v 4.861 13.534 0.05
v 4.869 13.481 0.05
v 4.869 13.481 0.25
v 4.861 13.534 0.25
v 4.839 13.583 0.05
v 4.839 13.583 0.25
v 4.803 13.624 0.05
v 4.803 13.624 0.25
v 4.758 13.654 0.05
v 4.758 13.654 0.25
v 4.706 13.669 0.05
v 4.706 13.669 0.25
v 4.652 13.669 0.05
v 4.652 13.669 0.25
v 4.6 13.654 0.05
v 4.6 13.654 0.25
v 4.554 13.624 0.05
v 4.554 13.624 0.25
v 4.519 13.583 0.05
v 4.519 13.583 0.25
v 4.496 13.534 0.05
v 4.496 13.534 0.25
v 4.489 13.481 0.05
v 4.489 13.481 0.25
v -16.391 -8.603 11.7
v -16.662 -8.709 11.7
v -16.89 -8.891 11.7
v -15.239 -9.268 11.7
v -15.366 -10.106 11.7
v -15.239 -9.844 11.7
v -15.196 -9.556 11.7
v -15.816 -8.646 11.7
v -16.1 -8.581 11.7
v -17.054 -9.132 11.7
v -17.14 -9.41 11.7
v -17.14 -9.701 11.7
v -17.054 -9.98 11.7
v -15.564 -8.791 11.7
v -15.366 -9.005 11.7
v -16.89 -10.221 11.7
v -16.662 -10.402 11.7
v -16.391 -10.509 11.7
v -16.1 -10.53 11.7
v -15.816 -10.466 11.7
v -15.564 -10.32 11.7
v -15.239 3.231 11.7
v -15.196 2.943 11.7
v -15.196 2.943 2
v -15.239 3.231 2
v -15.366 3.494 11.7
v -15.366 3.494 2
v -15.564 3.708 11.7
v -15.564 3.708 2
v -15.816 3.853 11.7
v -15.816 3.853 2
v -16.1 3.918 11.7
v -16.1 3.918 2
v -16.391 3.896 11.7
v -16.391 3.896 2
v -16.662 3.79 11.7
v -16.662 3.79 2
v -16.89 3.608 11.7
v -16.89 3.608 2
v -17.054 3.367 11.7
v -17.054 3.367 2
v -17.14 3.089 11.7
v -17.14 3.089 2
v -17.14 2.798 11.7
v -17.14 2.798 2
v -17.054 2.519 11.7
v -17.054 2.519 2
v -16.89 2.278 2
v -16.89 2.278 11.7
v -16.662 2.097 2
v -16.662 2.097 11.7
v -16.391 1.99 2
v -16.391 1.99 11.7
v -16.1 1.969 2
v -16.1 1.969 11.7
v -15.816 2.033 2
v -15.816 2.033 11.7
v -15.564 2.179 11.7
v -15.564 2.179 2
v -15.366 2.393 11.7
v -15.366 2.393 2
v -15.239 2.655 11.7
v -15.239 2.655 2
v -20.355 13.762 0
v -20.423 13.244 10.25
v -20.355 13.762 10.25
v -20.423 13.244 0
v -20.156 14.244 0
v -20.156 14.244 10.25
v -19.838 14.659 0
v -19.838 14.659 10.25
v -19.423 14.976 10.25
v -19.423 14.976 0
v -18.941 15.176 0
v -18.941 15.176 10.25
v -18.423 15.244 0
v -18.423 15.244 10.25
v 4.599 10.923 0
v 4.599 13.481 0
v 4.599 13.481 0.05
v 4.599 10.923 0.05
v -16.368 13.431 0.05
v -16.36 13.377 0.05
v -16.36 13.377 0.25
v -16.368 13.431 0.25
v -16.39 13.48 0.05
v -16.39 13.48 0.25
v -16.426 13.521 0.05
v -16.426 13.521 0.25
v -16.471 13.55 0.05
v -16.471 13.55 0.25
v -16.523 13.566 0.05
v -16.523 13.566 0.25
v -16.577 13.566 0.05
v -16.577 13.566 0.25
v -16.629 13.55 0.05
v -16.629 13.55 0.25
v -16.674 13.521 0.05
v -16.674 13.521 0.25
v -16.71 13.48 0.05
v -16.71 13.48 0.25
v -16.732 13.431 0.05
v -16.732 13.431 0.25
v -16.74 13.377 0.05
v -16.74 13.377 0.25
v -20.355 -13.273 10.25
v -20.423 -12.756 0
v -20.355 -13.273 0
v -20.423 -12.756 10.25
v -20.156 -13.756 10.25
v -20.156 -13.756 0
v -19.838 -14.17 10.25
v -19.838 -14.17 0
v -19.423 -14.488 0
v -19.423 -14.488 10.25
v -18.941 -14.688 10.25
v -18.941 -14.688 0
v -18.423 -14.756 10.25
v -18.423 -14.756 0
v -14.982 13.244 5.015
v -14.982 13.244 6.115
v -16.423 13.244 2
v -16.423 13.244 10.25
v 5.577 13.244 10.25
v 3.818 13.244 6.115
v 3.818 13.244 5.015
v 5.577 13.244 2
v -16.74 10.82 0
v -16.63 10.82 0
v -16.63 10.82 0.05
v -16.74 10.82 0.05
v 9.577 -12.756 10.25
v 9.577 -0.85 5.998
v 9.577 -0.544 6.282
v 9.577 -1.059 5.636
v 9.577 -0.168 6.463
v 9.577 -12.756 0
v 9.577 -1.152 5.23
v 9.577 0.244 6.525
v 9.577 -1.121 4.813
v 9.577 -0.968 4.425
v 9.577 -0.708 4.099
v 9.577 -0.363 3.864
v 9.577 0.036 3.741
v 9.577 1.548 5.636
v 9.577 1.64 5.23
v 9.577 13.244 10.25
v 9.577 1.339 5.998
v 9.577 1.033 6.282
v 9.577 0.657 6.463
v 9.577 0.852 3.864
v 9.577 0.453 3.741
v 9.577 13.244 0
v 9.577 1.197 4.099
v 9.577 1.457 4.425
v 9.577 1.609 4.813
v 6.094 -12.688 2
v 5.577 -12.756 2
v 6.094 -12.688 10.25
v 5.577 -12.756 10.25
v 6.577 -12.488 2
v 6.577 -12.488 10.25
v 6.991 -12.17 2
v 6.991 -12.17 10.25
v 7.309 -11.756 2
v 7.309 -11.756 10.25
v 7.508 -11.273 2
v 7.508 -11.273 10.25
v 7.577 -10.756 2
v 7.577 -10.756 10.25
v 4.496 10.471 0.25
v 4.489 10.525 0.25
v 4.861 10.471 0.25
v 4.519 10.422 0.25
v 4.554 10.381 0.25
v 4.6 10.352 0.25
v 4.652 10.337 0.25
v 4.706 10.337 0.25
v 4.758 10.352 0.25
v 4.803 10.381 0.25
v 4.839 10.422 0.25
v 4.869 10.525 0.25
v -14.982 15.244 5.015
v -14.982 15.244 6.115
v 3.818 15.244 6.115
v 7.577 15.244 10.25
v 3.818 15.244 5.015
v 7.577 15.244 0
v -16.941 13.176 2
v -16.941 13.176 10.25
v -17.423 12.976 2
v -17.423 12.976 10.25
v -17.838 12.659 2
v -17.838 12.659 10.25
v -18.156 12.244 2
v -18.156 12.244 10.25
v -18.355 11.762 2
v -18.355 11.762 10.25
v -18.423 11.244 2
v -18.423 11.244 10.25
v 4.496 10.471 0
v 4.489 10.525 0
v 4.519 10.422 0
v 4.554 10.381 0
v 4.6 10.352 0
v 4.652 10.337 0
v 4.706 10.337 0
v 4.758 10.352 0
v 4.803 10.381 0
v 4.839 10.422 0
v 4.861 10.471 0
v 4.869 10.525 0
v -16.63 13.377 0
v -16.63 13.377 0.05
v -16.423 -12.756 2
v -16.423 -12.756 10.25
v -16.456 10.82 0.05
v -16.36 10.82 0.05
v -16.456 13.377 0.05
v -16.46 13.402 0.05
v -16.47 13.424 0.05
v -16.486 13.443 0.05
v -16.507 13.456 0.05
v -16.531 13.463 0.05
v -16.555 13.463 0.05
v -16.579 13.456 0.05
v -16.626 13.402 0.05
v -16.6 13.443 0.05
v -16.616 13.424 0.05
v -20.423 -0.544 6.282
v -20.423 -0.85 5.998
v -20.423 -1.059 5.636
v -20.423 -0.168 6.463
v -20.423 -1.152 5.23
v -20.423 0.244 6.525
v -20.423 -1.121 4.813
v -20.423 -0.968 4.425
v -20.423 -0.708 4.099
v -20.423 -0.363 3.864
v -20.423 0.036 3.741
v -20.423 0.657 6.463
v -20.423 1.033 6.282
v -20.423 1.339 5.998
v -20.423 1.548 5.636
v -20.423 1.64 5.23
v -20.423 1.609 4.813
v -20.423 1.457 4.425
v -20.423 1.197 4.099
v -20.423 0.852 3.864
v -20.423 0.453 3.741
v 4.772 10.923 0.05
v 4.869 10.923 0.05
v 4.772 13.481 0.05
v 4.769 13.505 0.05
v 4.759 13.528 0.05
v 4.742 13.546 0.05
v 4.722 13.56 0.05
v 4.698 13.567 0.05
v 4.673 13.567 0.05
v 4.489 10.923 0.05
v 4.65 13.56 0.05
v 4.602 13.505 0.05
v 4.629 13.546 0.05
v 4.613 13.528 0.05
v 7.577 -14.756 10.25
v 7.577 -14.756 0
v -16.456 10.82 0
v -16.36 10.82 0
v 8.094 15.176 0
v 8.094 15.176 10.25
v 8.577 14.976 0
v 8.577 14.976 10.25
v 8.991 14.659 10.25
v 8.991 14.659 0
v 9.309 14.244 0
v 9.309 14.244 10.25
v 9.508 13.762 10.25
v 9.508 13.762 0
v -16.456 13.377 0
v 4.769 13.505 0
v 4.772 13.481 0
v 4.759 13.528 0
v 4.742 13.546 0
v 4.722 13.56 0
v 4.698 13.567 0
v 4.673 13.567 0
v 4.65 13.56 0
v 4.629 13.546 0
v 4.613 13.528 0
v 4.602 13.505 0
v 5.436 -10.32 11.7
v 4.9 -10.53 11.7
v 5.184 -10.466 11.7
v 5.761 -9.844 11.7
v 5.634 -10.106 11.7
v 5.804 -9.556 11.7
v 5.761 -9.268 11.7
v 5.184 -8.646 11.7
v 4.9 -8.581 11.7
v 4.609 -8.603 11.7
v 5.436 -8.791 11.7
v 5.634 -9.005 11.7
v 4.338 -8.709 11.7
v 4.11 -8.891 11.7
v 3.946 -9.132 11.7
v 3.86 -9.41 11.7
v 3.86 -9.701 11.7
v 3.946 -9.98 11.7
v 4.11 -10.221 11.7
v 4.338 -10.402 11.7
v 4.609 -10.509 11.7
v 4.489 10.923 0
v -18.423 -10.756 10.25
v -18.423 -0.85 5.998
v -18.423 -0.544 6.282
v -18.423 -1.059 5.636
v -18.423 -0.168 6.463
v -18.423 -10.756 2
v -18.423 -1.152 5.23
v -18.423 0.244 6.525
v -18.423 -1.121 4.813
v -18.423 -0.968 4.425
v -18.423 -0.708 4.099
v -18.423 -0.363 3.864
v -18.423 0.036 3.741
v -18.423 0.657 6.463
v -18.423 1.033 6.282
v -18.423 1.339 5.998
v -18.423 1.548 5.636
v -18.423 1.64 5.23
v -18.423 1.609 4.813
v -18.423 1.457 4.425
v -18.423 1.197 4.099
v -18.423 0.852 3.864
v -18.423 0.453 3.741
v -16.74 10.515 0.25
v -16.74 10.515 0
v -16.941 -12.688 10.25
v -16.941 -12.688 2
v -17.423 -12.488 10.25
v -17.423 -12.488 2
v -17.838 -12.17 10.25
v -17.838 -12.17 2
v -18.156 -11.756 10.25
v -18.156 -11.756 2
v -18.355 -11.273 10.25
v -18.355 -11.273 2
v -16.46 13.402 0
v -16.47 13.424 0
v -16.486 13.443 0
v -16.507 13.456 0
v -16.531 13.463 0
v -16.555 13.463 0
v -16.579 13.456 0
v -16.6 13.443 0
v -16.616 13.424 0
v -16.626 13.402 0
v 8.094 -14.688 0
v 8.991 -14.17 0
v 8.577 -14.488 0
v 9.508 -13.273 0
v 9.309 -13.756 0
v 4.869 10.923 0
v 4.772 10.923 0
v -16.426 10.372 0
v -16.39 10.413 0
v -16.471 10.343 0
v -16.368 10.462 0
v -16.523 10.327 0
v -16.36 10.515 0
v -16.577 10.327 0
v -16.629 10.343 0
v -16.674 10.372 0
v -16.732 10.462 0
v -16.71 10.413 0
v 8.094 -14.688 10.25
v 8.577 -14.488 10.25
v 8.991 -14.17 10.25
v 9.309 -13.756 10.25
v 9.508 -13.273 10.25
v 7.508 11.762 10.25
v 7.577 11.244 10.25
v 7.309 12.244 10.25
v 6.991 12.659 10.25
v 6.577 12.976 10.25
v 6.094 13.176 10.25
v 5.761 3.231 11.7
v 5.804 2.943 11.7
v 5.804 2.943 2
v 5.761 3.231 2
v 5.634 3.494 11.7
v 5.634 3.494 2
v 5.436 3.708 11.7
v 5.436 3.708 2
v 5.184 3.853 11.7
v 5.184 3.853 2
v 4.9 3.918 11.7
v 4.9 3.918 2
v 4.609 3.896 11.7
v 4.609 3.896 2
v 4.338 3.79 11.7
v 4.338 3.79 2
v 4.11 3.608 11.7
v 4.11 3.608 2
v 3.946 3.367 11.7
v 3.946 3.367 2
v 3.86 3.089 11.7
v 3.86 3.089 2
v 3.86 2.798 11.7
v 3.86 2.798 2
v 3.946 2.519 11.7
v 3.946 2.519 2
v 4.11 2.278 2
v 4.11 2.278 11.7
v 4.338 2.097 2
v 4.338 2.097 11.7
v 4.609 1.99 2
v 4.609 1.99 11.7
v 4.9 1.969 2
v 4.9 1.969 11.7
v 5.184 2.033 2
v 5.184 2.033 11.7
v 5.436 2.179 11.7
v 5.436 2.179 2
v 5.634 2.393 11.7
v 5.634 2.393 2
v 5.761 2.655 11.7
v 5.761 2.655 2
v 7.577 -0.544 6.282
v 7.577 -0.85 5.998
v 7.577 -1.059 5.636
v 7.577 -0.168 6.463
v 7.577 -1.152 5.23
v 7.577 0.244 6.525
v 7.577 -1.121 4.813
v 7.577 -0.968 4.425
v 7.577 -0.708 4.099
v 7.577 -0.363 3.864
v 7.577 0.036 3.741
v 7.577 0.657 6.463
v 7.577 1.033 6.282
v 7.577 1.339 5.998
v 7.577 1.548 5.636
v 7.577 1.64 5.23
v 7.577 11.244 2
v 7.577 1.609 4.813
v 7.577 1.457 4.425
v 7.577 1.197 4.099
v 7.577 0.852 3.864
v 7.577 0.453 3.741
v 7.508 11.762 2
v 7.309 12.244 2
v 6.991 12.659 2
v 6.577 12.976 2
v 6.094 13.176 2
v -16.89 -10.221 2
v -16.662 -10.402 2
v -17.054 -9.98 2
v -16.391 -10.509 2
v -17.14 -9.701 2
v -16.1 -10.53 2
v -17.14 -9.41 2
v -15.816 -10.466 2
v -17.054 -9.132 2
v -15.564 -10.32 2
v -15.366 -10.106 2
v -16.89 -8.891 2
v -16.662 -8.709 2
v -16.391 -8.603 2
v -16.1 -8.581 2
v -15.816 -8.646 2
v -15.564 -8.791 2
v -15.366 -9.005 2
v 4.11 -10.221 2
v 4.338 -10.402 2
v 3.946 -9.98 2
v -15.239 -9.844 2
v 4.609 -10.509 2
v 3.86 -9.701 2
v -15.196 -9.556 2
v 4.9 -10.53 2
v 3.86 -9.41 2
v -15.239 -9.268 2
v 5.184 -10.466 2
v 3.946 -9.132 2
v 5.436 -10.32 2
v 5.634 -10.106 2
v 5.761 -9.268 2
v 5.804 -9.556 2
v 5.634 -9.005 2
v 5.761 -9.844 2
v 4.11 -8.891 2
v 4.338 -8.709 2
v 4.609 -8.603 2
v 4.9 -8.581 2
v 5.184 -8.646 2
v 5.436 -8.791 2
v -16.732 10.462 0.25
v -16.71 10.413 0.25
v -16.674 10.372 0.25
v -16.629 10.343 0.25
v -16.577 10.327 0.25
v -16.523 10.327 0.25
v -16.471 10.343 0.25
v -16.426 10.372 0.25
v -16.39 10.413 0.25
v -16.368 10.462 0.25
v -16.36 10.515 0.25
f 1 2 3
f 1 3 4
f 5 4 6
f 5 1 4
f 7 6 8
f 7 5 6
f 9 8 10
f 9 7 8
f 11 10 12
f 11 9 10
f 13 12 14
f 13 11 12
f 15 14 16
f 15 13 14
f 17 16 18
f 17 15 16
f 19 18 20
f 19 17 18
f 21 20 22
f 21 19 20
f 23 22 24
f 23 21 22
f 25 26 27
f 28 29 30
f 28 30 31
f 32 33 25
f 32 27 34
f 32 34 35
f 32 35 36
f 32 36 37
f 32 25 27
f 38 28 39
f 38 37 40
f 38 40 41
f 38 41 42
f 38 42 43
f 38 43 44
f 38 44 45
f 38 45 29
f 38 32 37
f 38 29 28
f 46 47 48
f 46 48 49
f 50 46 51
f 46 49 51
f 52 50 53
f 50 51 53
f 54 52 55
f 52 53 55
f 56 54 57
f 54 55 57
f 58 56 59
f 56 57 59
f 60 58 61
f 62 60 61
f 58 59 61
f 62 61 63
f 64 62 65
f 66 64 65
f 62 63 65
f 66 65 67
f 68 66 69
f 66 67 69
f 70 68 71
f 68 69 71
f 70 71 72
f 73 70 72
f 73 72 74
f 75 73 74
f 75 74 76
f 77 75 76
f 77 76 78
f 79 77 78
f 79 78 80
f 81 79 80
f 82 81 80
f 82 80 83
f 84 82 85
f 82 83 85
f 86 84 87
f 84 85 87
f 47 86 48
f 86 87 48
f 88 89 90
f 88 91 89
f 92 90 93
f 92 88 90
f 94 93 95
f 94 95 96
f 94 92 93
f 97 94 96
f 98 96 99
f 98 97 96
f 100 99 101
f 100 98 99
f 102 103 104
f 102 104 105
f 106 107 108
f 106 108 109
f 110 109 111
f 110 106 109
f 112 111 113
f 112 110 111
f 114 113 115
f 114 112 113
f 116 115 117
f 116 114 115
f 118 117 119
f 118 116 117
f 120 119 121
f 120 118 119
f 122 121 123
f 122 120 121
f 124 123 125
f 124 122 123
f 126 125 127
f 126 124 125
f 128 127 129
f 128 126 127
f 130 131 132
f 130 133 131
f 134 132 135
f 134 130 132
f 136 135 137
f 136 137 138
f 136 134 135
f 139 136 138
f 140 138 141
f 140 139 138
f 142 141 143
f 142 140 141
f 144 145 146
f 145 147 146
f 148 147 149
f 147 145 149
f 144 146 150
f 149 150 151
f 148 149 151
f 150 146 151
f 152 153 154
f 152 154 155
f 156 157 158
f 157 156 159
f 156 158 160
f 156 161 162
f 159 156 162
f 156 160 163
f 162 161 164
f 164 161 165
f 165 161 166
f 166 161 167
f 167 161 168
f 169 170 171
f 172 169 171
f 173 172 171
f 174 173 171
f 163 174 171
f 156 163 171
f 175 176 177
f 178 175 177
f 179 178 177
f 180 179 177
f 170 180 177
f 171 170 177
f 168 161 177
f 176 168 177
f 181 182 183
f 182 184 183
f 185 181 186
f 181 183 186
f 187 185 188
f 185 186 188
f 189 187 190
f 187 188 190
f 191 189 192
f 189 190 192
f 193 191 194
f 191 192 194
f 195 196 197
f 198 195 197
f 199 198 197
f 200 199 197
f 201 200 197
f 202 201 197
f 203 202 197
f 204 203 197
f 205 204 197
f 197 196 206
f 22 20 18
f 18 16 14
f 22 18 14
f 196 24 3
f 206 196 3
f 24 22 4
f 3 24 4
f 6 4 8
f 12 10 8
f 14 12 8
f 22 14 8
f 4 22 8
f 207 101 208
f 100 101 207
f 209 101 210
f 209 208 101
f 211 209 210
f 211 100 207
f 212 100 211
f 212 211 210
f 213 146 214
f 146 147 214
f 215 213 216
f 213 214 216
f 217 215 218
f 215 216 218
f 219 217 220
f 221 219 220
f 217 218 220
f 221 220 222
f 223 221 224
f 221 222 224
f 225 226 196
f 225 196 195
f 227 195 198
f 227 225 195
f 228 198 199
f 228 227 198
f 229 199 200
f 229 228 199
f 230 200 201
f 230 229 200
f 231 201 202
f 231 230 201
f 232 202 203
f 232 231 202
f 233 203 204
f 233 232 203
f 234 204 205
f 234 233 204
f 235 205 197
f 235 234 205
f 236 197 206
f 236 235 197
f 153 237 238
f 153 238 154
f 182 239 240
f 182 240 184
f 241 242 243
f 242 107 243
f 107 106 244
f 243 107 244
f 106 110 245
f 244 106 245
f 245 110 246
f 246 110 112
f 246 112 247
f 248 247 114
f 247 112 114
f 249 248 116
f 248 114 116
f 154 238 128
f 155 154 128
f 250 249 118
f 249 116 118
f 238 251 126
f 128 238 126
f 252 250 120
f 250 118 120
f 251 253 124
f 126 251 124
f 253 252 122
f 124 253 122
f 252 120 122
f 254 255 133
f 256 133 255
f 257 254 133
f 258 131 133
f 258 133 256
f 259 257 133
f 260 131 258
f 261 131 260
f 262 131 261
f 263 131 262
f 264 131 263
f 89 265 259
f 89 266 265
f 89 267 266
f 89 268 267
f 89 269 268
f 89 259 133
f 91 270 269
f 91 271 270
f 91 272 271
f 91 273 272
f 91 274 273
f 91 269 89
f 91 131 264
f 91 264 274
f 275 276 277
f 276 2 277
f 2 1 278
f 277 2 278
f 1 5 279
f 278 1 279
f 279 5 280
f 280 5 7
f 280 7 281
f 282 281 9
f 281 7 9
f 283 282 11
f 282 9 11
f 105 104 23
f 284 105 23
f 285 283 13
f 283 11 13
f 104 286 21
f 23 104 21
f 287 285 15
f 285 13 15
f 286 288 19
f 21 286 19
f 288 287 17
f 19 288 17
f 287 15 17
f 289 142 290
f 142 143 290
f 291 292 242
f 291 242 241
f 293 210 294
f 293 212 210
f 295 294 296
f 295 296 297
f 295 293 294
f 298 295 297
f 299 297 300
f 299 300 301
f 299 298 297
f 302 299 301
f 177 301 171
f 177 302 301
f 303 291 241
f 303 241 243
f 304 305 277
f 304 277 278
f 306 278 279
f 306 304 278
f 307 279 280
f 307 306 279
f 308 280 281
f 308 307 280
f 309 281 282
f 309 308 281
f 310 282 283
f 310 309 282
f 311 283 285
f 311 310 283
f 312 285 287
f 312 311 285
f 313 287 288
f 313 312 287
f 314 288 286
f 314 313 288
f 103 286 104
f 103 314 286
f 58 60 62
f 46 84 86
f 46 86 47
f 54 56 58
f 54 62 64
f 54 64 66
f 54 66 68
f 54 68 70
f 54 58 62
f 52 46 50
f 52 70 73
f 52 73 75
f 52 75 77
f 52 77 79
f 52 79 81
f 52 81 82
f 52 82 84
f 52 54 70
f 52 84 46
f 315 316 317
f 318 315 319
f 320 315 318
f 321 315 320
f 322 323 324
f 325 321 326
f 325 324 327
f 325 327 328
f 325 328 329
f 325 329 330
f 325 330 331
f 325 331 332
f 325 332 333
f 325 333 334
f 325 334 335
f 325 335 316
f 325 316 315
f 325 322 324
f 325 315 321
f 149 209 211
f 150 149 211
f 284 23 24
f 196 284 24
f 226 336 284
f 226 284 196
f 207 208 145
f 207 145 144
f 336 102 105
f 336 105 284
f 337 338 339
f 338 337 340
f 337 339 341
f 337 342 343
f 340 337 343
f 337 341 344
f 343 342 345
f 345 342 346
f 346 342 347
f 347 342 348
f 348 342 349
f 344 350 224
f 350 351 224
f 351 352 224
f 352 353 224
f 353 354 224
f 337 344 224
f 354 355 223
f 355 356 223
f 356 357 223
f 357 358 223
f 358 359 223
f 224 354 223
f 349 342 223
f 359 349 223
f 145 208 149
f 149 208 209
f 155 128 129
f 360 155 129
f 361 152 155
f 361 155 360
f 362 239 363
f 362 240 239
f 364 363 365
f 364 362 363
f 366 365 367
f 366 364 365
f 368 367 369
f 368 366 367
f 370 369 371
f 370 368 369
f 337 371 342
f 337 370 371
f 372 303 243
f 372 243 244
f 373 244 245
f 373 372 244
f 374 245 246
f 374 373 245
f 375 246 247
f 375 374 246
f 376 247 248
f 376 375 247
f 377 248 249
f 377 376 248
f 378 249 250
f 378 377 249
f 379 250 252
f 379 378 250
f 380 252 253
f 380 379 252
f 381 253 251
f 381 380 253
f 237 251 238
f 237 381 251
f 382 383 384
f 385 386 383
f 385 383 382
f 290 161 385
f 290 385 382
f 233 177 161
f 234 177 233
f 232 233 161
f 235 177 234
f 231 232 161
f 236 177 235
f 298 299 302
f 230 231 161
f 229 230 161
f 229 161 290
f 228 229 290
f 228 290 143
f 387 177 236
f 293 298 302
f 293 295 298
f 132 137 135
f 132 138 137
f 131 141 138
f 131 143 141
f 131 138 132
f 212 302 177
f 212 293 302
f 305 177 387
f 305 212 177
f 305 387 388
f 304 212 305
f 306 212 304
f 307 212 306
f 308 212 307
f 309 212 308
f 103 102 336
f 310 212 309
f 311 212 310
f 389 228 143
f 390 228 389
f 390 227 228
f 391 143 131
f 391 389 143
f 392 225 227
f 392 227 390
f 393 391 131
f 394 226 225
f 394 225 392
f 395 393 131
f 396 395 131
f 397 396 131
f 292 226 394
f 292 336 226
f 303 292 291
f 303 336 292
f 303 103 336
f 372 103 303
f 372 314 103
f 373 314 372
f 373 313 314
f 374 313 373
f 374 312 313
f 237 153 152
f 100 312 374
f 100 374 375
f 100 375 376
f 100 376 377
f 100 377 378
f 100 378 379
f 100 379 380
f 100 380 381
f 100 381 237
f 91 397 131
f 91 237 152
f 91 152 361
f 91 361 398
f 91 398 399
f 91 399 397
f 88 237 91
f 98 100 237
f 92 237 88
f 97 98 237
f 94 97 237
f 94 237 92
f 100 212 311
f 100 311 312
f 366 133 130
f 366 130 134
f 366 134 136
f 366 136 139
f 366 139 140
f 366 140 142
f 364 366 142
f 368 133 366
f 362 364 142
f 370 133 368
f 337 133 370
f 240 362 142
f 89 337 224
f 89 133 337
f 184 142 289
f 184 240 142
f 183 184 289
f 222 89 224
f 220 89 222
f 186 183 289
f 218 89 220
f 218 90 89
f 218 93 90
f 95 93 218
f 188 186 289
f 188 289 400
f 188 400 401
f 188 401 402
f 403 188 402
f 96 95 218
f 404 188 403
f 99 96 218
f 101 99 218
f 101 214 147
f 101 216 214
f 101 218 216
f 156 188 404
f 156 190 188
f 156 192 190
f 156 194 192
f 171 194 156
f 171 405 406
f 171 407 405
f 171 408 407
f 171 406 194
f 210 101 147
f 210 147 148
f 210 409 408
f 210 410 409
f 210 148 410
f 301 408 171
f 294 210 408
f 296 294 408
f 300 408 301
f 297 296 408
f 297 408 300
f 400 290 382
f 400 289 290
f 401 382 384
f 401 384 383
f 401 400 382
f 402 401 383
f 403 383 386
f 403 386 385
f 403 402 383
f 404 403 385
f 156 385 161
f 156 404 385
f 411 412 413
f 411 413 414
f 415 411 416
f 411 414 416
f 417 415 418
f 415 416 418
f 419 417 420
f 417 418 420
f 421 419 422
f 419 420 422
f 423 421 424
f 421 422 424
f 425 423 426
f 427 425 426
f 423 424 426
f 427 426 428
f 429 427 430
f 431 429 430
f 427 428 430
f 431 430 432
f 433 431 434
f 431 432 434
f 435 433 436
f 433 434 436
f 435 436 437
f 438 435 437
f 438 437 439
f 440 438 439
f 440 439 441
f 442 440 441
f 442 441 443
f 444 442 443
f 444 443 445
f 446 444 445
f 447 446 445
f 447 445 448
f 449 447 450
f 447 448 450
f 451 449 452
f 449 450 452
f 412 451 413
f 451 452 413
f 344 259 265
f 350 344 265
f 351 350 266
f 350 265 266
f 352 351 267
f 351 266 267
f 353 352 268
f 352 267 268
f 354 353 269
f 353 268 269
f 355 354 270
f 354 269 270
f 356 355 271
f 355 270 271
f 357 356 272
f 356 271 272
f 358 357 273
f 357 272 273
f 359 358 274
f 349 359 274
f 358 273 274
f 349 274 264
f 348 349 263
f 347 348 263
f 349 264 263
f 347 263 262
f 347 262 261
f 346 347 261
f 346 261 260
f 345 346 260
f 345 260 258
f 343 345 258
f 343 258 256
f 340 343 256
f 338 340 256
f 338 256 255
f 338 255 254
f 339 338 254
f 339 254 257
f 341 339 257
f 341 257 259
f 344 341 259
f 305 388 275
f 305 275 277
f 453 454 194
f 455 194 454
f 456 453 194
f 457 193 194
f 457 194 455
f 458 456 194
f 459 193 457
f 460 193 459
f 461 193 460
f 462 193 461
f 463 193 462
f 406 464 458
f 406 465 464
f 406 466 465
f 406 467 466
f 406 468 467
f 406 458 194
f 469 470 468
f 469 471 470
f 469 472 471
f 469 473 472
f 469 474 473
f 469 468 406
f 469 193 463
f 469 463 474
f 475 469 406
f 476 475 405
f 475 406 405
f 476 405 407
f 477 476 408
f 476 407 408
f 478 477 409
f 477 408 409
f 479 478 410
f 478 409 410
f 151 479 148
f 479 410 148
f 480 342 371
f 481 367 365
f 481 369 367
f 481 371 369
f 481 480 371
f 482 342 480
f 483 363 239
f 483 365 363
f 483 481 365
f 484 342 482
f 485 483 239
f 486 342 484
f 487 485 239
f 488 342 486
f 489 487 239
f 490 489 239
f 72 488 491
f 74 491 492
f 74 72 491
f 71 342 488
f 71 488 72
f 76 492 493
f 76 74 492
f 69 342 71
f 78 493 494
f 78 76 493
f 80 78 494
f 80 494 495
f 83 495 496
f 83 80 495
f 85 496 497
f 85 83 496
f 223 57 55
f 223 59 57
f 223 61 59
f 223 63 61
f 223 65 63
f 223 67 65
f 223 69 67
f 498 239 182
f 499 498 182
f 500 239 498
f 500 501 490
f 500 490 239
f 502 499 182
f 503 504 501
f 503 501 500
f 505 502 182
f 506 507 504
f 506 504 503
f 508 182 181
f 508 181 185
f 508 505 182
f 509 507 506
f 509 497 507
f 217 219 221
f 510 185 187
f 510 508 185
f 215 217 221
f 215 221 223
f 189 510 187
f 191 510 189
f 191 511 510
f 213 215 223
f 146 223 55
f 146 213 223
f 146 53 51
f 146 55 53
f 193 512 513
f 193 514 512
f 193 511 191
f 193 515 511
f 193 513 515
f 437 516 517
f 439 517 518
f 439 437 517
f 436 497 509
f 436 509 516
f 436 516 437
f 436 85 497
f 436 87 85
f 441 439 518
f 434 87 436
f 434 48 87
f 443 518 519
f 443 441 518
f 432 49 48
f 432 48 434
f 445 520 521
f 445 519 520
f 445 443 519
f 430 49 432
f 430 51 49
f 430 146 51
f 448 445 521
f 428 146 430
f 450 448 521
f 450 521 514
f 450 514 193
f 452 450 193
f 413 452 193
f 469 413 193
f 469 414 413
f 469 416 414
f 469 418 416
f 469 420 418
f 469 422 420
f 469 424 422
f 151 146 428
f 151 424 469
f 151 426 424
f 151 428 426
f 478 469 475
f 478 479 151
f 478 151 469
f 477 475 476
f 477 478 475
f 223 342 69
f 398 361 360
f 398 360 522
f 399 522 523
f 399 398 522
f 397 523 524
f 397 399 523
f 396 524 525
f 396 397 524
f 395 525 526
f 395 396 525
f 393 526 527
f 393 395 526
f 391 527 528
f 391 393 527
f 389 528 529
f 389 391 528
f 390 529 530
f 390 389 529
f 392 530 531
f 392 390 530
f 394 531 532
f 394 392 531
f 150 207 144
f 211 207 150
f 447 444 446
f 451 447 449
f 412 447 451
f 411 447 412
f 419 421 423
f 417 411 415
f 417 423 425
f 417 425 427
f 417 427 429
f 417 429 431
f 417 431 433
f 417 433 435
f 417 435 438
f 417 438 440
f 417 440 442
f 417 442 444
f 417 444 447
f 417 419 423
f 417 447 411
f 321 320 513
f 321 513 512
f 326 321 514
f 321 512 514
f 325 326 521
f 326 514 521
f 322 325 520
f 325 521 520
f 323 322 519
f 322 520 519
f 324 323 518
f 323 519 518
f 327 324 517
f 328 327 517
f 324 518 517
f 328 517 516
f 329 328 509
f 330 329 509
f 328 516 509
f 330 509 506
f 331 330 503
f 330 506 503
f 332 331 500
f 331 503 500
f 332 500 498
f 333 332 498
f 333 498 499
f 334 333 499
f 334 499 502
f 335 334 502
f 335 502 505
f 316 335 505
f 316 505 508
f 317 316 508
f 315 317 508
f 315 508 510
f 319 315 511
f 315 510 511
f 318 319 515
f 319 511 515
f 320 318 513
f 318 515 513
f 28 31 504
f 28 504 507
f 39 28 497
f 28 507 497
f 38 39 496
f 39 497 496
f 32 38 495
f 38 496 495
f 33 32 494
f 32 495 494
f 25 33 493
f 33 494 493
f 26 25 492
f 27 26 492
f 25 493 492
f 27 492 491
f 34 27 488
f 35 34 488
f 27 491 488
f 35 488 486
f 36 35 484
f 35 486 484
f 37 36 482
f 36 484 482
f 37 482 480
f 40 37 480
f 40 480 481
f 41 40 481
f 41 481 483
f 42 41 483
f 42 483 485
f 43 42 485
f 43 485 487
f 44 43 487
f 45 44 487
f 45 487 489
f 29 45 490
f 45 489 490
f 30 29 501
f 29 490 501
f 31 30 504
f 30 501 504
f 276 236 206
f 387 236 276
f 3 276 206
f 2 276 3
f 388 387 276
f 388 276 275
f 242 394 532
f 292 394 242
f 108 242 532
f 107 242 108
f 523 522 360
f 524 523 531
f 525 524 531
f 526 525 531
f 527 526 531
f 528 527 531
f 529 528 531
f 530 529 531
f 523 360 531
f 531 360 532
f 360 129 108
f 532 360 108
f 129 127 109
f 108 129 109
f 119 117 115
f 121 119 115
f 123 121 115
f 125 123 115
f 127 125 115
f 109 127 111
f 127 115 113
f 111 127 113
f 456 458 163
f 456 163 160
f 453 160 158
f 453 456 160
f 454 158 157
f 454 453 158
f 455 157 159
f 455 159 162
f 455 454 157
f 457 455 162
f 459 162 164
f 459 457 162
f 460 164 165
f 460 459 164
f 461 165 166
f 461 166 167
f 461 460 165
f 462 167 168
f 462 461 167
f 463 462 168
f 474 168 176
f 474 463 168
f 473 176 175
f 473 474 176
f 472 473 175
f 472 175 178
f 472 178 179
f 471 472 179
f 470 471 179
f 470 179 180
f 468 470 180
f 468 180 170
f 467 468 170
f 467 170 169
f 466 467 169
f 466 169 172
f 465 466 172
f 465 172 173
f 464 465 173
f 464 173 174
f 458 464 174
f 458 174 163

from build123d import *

# Parameters (mm, degrees)
SKETCH1_W           = 30
SKETCH1_H           = 30
BOSS_EXTRUDE1_DEPTH = 2
SKETCH4_R           = 0.9775
BOSS_EXTRUDE3_DEPTH = 9.7
SKETCH5_W           = 30
SKETCH5_H           = 30
SKETCH5_W_2         = 26
SKETCH5_H_2         = 26
BOSS_EXTRUDE4_DEPTH = 8.25
SKETCH6_W           = 18.8
SKETCH6_H           = 1.1
CUT_EXTRUDE1_DEPTH  = 10
FILLET1_R           = 2
CUT_EXTRUDE4_DEPTH  = 0.25
BOSS_EXTRUDE6_DEPTH = 0.05
CUT_EXTRUDE5_DEPTH  = 0.25
BOSS_EXTRUDE7_DEPTH = 0.05
SKETCH23_R          = 1.4
CUT_EXTRUDE6_DEPTH  = 3
CUT_EXTRUDE7_START  = -3
SKETCH24_R          = 1.4
CUT_EXTRUDE7_DEPTH  = 3


with BuildPart() as part:
    # Sketch1 → Boss-Extrude1 (new body)
    with BuildSketch(Plane.XY):
        with Locations((-5.423452769, 0.244299674)):
            Rectangle(SKETCH1_W, SKETCH1_H)
    extrude(amount=BOSS_EXTRUDE1_DEPTH)

    # Sketch4 → Boss-Extrude3 (add)
    with BuildSketch(Plane.XY.offset(2)):
        with Locations((-16.173452769, 2.943299674)):
            Circle(SKETCH4_R)
        with Locations((-16.173452769, -9.555700326)):
            Circle(SKETCH4_R)
        with Locations((4.826547231, 2.943299674)):
            Circle(SKETCH4_R)
        with Locations((4.826547231, -9.555700326)):
            Circle(SKETCH4_R)
    extrude(amount=BOSS_EXTRUDE3_DEPTH)

    # Sketch5 → Boss-Extrude4 (add)
    with BuildSketch(Plane.XY.offset(2)):
        with Locations((-5.423452769, 0.244299674)):
            Rectangle(SKETCH5_W, SKETCH5_H)
        with Locations((-5.423452769, 0.244299674)):
            Rectangle(SKETCH5_W_2, SKETCH5_H_2, mode=Mode.SUBTRACT)
    extrude(amount=BOSS_EXTRUDE4_DEPTH)

    # Sketch6 → Cut-Extrude1 (cut)
    with BuildSketch(Plane(origin=(0, 15.244299674, 0), x_dir=(1, 0, 0), z_dir=(0, 1, 0))):
        with Locations((-5.582175382, -5.564963199)):
            Rectangle(SKETCH6_W, SKETCH6_H)
    extrude(amount=-CUT_EXTRUDE1_DEPTH, mode=Mode.SUBTRACT)

    # Fillet1
    fillet1_edges = [part.edges().sort_by_distance(p)[0] for p in [
        (7.576547231, 13.244299674, 6.125),
        (7.576547231, -12.755700326, 6.125),
        (-18.423452769, -12.755700326, 6.125),
        (-18.423452769, 13.244299674, 6.125),
        (-20.423452769, 15.244299674, 5.125),
        (9.576547231, 15.244299674, 5.125),
        (9.576547231, -14.755700326, 5.125),
        (-20.423452769, -14.755700326, 5.125),
    ]]
    fillet(fillet1_edges, radius=FILLET1_R)

    # Sketch15 → Cut-Extrude4 (cut)
    with BuildSketch(Plane(origin=(0, 0, 0), x_dir=(-1, 0, 0), z_dir=(0, 0, -1))):
        with BuildLine():
            Line((-4.48872314, 13.480732705), (-4.48872314, 10.524770746))
            ThreePointArc((-4.48872314, 10.524770746), (-4.67872314, 10.334770746), (-4.86872314, 10.524770746))
            Line((-4.86872314, 10.524770746), (-4.86872314, 13.480732705))
            ThreePointArc((-4.86872314, 13.480732705), (-4.67872314, 13.670732705), (-4.48872314, 13.480732705))
        make_face()
    extrude(amount=-CUT_EXTRUDE4_DEPTH, mode=Mode.SUBTRACT)

    # Sketch16 → Boss-Extrude6 (add)
    with BuildSketch(Plane(origin=(0, 0, 0), x_dir=(-1, 0, 0), z_dir=(0, 0, -1))):
        with BuildLine():
            Line((-4.86872314, 10.923343064), (-4.772315146, 10.923343064))
            Line((-4.772315146, 10.923343064), (-4.772315146, 13.480732705))
            ThreePointArc((-4.772315146, 13.480732705), (-4.68554888, 13.567498971), (-4.598782614, 13.480732705))
            Line((-4.598782614, 13.480732705), (-4.598782614, 10.923343064))
            Line((-4.598782614, 10.923343064), (-4.48872314, 10.923343064))
            Line((-4.48872314, 10.923343064), (-4.48872314, 13.480732705))
            ThreePointArc((-4.48872314, 13.480732705), (-4.67872314, 13.670732705), (-4.86872314, 13.480732705))
            Line((-4.86872314, 13.480732705), (-4.86872314, 10.923343064))
        make_face()
    extrude(amount=-BOSS_EXTRUDE6_DEPTH)

    # Sketch20 → Cut-Extrude5 (cut)
    with BuildSketch(Plane(origin=(0, 0, 0), x_dir=(-1, 0, 0), z_dir=(0, 0, -1))):
        with BuildLine():
            Line((16.739959819, 13.377498971), (16.739959819, 10.515388846))
            ThreePointArc((16.739959819, 10.515388846), (16.549959819, 10.325388846), (16.359959819, 10.515388846))
            Line((16.359959819, 10.515388846), (16.359959819, 13.377498971))
            ThreePointArc((16.359959819, 13.377498971), (16.549959819, 13.567498971), (16.739959819, 13.377498971))
        make_face()
    extrude(amount=-CUT_EXTRUDE5_DEPTH, mode=Mode.SUBTRACT)

    # Sketch19 → Boss-Extrude7 (add)
    with BuildSketch(Plane(origin=(0, 0, 0), x_dir=(-1, 0, 0), z_dir=(0, 0, -1))):
        with BuildLine():
            Line((16.359959819, 10.82010933), (16.456367814, 10.82010933))
            Line((16.456367814, 10.82010933), (16.456367814, 13.377498971))
            ThreePointArc((16.456367814, 13.377498971), (16.543134079, 13.464265237), (16.629900345, 13.377498971))
            Line((16.629900345, 13.377498971), (16.629900345, 10.82010933))
            Line((16.629900345, 10.82010933), (16.739959819, 10.82010933))
            Line((16.739959819, 10.82010933), (16.739959819, 13.377498971))
            ThreePointArc((16.739959819, 13.377498971), (16.549959819, 13.567498971), (16.359959819, 13.377498971))
            Line((16.359959819, 13.377498971), (16.359959819, 10.82010933))
        make_face()
    extrude(amount=-BOSS_EXTRUDE7_DEPTH)

    # Sketch23 → Cut-Extrude6 (cut)
    with BuildSketch(Plane.ZY.offset(20.423452769)):
        with Locations((5.125, 0.244299674)):
            Circle(SKETCH23_R)
    extrude(amount=-CUT_EXTRUDE6_DEPTH, mode=Mode.SUBTRACT)

    # Sketch24 → Cut-Extrude7 (cut)
    with BuildSketch(Plane(origin=(9.576547231, 0, 0), x_dir=(0, 0, -1), z_dir=(1, 0, 0)).offset(CUT_EXTRUDE7_START)):
        with Locations(Location((-5.125, 0.244299674, 0), (0, 0, 180))):
            Circle(SKETCH24_R)
    extrude(amount=CUT_EXTRUDE7_DEPTH, mode=Mode.SUBTRACT)


solid = part.part
